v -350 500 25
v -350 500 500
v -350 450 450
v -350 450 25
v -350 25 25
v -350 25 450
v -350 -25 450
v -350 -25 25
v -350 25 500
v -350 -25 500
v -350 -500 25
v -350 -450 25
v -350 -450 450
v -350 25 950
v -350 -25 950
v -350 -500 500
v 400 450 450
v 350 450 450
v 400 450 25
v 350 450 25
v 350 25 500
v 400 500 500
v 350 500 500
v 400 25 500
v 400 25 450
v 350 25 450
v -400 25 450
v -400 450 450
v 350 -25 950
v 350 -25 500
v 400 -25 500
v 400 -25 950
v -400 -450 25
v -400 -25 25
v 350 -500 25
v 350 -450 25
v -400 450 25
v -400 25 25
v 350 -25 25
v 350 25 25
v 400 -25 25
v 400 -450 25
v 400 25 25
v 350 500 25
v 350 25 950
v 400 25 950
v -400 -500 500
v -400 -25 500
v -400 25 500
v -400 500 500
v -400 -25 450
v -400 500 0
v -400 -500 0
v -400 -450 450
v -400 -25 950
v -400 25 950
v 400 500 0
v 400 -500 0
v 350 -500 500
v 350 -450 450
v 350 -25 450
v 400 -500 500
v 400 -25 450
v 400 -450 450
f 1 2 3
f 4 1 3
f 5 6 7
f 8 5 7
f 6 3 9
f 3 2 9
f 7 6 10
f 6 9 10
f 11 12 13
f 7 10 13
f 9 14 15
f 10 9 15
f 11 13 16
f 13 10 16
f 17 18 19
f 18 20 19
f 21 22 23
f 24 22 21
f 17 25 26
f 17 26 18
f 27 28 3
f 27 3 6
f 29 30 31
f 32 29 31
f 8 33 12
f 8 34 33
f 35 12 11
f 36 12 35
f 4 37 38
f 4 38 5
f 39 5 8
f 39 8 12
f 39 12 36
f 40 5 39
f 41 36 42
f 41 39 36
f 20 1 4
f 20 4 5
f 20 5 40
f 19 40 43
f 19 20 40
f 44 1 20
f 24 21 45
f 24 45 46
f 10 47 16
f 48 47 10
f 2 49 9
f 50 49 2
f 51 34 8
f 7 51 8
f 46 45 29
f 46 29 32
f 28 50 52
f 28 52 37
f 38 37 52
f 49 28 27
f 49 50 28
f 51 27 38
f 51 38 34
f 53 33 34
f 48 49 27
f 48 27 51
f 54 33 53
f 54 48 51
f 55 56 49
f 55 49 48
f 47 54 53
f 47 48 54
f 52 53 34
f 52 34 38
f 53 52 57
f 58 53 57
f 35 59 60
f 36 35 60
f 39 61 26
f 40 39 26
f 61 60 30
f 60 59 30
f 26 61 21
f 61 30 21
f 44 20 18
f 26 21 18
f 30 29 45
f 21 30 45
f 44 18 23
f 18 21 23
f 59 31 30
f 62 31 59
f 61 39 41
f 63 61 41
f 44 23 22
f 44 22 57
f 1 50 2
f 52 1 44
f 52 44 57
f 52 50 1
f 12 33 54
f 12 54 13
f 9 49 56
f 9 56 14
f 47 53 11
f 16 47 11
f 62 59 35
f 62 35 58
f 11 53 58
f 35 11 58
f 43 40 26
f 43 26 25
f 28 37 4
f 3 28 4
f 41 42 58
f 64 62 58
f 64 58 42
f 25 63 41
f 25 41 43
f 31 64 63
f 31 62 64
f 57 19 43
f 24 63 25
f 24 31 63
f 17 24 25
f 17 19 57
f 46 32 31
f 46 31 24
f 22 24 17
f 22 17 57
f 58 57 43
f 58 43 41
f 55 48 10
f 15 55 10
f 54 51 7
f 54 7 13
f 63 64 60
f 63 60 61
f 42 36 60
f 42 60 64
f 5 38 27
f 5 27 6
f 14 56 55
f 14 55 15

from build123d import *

# Parameters (mm, degrees)
F0_W      = 50
F0_H      = 50
F1_DEPTH  = 50
F0_H_2    = 425
F2_DEPTH  = 25
F3_DEPTH  = 350
F5_DEPTH  = 50
F6_DEPTH  = 500
F8_DEPTH  = 50
F10_DEPTH = 50


with BuildPart() as f1:
    # F0 (on Top) → F1 (new body)
    with BuildSketch(Plane.XY):
        with Locations((-375, 475)):
            Rectangle(F0_W, F0_H)
    extrude(amount=F1_DEPTH)


with BuildPart() as f1b:
    # F0 (on Top) → F1, piece 2 (new body)
    with BuildSketch(Plane.XY):
        with Locations((-375, 0)):
            Rectangle(F0_W, F0_H)
    extrude(amount=F1_DEPTH)


with BuildPart() as f1c:
    # F0 (on Top) → F1, piece 3 (new body)
    with BuildSketch(Plane.XY):
        with Locations((375, 475)):
            Rectangle(F0_W, F0_H)
    extrude(amount=F1_DEPTH)


with BuildPart() as f1d:
    # F0 (on Top) → F1, piece 4 (new body)
    with BuildSketch(Plane.XY):
        with Locations((375, 0)):
            Rectangle(F0_W, F0_H)
    extrude(amount=F1_DEPTH)


with BuildPart() as f1e:
    # F0 (on Top) → F1, piece 5 (new body)
    with BuildSketch(Plane.XY):
        with Locations((-375, -475)):
            Rectangle(F0_W, F0_H)
    extrude(amount=F1_DEPTH)


with BuildPart() as f1f:
    # F0 (on Top) → F1, piece 6 (new body)
    with BuildSketch(Plane.XY):
        with Locations((375, -475)):
            Rectangle(F0_W, F0_H)
    extrude(amount=F1_DEPTH)


with BuildPart() as f2:
    # F0 (on Top) → F2 (new body)
    with BuildSketch(Plane.XY):
        with Locations((375, -475)):
            Rectangle(F0_W, F0_H)
        Polygon((-350, -500), (350, -500), (350, -450), (350, -25), (350, 25), (350, 450), (350, 500), (-350, 500), (-350, 450), (-350, 25), (-350, -25), (-350, -450), align=None)
        with Locations((375, -237.5)):
            Rectangle(F0_W, F0_H_2)
        with Locations((-375, -475)):
            Rectangle(F0_W, F0_H)
        with Locations((375, 0)):
            Rectangle(F0_W, F0_H)
        with Locations((-375, -237.5)):
            Rectangle(F0_W, F0_H_2)
        with Locations((375, 237.5)):
            Rectangle(F0_W, F0_H_2)
        with Locations((-375, 0)):
            Rectangle(F0_W, F0_H)
        with Locations((375, 475)):
            Rectangle(F0_W, F0_H)
        with Locations((-375, 237.5)):
            Rectangle(F0_W, F0_H_2)
        with Locations((-375, 475)):
            Rectangle(F0_W, F0_H)
    extrude(amount=F2_DEPTH)


with BuildPart() as f3:
    # F3 (new): a face of the model
    f3_faces = [f1e.part.faces().sort_by_distance(p)[0] for p in [
        (-375, -475, 50),
    ]]
    extrude(f3_faces, amount=F3_DEPTH)


with BuildPart() as f3b:
    # F3#2 (new): a face of the model
    f3_2_faces = [f1b.part.faces().sort_by_distance(p)[0] for p in [
        (-375, 0, 50),
    ]]
    extrude(f3_2_faces, amount=F3_DEPTH)


with BuildPart() as f3c:
    # F3#3 (new): a face of the model
    f3_3_faces = [f1.part.faces().sort_by_distance(p)[0] for p in [
        (-375, 475, 50),
    ]]
    extrude(f3_3_faces, amount=F3_DEPTH)


with BuildPart() as f3d:
    # F3#4 (new): a face of the model
    f3_4_faces = [f1c.part.faces().sort_by_distance(p)[0] for p in [
        (375, 475, 50),
    ]]
    extrude(f3_4_faces, amount=F3_DEPTH)


with BuildPart() as f3e:
    # F3#5 (new): a face of the model
    f3_5_faces = [f1d.part.faces().sort_by_distance(p)[0] for p in [
        (375, 0, 50),
    ]]
    extrude(f3_5_faces, amount=F3_DEPTH)


with BuildPart() as f3f:
    # F3#6 (new): a face of the model
    f3_6_faces = [f1f.part.faces().sort_by_distance(p)[0] for p in [
        (375, -475, 50),
    ]]
    extrude(f3_6_faces, amount=F3_DEPTH)


with BuildPart() as f3_1:
    add(f3.part)

    # F4: union F3b, F3c, F3d, F3e, F3f, F2, F1d, F1e, F1b, F1, F1c, F1f
    add(f3b.part)
    add(f3c.part)
    add(f3d.part)
    add(f3e.part)
    add(f3f.part)
    add(f2.part)
    add(f1d.part)
    add(f1e.part)
    add(f1b.part)
    add(f1.part)
    add(f1c.part)
    add(f1f.part)

    # F5 (add): faces of the model
    f5_faces = [f3_1.faces().sort_by_distance(p)[0] for p in [
        (375, 475, 400),
        (375, 0, 400),
        (375, -475, 400),
        (-375, -475, 400),
        (-375, 0, 400),
        (-375, 475, 400),
    ]]
    extrude(f5_faces, amount=F5_DEPTH)

    # F6 (add): faces of the model
    f6_faces = [f3_1.faces().sort_by_distance(p)[0] for p in [
        (-375, 0, 450),
        (375, 0, 450),
    ]]
    extrude(f6_faces, amount=F6_DEPTH)

    # F7 (on face) → F8 (join)
    with BuildSketch(Plane.YZ.offset(400)):
        Polygon((25, 500), (25, 450), (450, 450), (500, 450), (500, 500), align=None)
        Polygon((-500, 500), (-500, 450), (-450, 450), (-25, 450), (-25, 500), align=None)
    extrude(amount=-F8_DEPTH)

    # F9 (on face) → F10 (join)
    with BuildSketch(Plane(origin=(-400, 0, 0), x_dir=(0, -1, 0), z_dir=(-1, 0, 0))):
        Polygon((-500, 500), (-500, 450), (-450, 450), (-25, 450), (-25, 500), align=None)
        Polygon((25, 500), (25, 450), (450, 450), (500, 450), (500, 500), align=None)
    extrude(amount=-F10_DEPTH)


solid = f3_1.part
